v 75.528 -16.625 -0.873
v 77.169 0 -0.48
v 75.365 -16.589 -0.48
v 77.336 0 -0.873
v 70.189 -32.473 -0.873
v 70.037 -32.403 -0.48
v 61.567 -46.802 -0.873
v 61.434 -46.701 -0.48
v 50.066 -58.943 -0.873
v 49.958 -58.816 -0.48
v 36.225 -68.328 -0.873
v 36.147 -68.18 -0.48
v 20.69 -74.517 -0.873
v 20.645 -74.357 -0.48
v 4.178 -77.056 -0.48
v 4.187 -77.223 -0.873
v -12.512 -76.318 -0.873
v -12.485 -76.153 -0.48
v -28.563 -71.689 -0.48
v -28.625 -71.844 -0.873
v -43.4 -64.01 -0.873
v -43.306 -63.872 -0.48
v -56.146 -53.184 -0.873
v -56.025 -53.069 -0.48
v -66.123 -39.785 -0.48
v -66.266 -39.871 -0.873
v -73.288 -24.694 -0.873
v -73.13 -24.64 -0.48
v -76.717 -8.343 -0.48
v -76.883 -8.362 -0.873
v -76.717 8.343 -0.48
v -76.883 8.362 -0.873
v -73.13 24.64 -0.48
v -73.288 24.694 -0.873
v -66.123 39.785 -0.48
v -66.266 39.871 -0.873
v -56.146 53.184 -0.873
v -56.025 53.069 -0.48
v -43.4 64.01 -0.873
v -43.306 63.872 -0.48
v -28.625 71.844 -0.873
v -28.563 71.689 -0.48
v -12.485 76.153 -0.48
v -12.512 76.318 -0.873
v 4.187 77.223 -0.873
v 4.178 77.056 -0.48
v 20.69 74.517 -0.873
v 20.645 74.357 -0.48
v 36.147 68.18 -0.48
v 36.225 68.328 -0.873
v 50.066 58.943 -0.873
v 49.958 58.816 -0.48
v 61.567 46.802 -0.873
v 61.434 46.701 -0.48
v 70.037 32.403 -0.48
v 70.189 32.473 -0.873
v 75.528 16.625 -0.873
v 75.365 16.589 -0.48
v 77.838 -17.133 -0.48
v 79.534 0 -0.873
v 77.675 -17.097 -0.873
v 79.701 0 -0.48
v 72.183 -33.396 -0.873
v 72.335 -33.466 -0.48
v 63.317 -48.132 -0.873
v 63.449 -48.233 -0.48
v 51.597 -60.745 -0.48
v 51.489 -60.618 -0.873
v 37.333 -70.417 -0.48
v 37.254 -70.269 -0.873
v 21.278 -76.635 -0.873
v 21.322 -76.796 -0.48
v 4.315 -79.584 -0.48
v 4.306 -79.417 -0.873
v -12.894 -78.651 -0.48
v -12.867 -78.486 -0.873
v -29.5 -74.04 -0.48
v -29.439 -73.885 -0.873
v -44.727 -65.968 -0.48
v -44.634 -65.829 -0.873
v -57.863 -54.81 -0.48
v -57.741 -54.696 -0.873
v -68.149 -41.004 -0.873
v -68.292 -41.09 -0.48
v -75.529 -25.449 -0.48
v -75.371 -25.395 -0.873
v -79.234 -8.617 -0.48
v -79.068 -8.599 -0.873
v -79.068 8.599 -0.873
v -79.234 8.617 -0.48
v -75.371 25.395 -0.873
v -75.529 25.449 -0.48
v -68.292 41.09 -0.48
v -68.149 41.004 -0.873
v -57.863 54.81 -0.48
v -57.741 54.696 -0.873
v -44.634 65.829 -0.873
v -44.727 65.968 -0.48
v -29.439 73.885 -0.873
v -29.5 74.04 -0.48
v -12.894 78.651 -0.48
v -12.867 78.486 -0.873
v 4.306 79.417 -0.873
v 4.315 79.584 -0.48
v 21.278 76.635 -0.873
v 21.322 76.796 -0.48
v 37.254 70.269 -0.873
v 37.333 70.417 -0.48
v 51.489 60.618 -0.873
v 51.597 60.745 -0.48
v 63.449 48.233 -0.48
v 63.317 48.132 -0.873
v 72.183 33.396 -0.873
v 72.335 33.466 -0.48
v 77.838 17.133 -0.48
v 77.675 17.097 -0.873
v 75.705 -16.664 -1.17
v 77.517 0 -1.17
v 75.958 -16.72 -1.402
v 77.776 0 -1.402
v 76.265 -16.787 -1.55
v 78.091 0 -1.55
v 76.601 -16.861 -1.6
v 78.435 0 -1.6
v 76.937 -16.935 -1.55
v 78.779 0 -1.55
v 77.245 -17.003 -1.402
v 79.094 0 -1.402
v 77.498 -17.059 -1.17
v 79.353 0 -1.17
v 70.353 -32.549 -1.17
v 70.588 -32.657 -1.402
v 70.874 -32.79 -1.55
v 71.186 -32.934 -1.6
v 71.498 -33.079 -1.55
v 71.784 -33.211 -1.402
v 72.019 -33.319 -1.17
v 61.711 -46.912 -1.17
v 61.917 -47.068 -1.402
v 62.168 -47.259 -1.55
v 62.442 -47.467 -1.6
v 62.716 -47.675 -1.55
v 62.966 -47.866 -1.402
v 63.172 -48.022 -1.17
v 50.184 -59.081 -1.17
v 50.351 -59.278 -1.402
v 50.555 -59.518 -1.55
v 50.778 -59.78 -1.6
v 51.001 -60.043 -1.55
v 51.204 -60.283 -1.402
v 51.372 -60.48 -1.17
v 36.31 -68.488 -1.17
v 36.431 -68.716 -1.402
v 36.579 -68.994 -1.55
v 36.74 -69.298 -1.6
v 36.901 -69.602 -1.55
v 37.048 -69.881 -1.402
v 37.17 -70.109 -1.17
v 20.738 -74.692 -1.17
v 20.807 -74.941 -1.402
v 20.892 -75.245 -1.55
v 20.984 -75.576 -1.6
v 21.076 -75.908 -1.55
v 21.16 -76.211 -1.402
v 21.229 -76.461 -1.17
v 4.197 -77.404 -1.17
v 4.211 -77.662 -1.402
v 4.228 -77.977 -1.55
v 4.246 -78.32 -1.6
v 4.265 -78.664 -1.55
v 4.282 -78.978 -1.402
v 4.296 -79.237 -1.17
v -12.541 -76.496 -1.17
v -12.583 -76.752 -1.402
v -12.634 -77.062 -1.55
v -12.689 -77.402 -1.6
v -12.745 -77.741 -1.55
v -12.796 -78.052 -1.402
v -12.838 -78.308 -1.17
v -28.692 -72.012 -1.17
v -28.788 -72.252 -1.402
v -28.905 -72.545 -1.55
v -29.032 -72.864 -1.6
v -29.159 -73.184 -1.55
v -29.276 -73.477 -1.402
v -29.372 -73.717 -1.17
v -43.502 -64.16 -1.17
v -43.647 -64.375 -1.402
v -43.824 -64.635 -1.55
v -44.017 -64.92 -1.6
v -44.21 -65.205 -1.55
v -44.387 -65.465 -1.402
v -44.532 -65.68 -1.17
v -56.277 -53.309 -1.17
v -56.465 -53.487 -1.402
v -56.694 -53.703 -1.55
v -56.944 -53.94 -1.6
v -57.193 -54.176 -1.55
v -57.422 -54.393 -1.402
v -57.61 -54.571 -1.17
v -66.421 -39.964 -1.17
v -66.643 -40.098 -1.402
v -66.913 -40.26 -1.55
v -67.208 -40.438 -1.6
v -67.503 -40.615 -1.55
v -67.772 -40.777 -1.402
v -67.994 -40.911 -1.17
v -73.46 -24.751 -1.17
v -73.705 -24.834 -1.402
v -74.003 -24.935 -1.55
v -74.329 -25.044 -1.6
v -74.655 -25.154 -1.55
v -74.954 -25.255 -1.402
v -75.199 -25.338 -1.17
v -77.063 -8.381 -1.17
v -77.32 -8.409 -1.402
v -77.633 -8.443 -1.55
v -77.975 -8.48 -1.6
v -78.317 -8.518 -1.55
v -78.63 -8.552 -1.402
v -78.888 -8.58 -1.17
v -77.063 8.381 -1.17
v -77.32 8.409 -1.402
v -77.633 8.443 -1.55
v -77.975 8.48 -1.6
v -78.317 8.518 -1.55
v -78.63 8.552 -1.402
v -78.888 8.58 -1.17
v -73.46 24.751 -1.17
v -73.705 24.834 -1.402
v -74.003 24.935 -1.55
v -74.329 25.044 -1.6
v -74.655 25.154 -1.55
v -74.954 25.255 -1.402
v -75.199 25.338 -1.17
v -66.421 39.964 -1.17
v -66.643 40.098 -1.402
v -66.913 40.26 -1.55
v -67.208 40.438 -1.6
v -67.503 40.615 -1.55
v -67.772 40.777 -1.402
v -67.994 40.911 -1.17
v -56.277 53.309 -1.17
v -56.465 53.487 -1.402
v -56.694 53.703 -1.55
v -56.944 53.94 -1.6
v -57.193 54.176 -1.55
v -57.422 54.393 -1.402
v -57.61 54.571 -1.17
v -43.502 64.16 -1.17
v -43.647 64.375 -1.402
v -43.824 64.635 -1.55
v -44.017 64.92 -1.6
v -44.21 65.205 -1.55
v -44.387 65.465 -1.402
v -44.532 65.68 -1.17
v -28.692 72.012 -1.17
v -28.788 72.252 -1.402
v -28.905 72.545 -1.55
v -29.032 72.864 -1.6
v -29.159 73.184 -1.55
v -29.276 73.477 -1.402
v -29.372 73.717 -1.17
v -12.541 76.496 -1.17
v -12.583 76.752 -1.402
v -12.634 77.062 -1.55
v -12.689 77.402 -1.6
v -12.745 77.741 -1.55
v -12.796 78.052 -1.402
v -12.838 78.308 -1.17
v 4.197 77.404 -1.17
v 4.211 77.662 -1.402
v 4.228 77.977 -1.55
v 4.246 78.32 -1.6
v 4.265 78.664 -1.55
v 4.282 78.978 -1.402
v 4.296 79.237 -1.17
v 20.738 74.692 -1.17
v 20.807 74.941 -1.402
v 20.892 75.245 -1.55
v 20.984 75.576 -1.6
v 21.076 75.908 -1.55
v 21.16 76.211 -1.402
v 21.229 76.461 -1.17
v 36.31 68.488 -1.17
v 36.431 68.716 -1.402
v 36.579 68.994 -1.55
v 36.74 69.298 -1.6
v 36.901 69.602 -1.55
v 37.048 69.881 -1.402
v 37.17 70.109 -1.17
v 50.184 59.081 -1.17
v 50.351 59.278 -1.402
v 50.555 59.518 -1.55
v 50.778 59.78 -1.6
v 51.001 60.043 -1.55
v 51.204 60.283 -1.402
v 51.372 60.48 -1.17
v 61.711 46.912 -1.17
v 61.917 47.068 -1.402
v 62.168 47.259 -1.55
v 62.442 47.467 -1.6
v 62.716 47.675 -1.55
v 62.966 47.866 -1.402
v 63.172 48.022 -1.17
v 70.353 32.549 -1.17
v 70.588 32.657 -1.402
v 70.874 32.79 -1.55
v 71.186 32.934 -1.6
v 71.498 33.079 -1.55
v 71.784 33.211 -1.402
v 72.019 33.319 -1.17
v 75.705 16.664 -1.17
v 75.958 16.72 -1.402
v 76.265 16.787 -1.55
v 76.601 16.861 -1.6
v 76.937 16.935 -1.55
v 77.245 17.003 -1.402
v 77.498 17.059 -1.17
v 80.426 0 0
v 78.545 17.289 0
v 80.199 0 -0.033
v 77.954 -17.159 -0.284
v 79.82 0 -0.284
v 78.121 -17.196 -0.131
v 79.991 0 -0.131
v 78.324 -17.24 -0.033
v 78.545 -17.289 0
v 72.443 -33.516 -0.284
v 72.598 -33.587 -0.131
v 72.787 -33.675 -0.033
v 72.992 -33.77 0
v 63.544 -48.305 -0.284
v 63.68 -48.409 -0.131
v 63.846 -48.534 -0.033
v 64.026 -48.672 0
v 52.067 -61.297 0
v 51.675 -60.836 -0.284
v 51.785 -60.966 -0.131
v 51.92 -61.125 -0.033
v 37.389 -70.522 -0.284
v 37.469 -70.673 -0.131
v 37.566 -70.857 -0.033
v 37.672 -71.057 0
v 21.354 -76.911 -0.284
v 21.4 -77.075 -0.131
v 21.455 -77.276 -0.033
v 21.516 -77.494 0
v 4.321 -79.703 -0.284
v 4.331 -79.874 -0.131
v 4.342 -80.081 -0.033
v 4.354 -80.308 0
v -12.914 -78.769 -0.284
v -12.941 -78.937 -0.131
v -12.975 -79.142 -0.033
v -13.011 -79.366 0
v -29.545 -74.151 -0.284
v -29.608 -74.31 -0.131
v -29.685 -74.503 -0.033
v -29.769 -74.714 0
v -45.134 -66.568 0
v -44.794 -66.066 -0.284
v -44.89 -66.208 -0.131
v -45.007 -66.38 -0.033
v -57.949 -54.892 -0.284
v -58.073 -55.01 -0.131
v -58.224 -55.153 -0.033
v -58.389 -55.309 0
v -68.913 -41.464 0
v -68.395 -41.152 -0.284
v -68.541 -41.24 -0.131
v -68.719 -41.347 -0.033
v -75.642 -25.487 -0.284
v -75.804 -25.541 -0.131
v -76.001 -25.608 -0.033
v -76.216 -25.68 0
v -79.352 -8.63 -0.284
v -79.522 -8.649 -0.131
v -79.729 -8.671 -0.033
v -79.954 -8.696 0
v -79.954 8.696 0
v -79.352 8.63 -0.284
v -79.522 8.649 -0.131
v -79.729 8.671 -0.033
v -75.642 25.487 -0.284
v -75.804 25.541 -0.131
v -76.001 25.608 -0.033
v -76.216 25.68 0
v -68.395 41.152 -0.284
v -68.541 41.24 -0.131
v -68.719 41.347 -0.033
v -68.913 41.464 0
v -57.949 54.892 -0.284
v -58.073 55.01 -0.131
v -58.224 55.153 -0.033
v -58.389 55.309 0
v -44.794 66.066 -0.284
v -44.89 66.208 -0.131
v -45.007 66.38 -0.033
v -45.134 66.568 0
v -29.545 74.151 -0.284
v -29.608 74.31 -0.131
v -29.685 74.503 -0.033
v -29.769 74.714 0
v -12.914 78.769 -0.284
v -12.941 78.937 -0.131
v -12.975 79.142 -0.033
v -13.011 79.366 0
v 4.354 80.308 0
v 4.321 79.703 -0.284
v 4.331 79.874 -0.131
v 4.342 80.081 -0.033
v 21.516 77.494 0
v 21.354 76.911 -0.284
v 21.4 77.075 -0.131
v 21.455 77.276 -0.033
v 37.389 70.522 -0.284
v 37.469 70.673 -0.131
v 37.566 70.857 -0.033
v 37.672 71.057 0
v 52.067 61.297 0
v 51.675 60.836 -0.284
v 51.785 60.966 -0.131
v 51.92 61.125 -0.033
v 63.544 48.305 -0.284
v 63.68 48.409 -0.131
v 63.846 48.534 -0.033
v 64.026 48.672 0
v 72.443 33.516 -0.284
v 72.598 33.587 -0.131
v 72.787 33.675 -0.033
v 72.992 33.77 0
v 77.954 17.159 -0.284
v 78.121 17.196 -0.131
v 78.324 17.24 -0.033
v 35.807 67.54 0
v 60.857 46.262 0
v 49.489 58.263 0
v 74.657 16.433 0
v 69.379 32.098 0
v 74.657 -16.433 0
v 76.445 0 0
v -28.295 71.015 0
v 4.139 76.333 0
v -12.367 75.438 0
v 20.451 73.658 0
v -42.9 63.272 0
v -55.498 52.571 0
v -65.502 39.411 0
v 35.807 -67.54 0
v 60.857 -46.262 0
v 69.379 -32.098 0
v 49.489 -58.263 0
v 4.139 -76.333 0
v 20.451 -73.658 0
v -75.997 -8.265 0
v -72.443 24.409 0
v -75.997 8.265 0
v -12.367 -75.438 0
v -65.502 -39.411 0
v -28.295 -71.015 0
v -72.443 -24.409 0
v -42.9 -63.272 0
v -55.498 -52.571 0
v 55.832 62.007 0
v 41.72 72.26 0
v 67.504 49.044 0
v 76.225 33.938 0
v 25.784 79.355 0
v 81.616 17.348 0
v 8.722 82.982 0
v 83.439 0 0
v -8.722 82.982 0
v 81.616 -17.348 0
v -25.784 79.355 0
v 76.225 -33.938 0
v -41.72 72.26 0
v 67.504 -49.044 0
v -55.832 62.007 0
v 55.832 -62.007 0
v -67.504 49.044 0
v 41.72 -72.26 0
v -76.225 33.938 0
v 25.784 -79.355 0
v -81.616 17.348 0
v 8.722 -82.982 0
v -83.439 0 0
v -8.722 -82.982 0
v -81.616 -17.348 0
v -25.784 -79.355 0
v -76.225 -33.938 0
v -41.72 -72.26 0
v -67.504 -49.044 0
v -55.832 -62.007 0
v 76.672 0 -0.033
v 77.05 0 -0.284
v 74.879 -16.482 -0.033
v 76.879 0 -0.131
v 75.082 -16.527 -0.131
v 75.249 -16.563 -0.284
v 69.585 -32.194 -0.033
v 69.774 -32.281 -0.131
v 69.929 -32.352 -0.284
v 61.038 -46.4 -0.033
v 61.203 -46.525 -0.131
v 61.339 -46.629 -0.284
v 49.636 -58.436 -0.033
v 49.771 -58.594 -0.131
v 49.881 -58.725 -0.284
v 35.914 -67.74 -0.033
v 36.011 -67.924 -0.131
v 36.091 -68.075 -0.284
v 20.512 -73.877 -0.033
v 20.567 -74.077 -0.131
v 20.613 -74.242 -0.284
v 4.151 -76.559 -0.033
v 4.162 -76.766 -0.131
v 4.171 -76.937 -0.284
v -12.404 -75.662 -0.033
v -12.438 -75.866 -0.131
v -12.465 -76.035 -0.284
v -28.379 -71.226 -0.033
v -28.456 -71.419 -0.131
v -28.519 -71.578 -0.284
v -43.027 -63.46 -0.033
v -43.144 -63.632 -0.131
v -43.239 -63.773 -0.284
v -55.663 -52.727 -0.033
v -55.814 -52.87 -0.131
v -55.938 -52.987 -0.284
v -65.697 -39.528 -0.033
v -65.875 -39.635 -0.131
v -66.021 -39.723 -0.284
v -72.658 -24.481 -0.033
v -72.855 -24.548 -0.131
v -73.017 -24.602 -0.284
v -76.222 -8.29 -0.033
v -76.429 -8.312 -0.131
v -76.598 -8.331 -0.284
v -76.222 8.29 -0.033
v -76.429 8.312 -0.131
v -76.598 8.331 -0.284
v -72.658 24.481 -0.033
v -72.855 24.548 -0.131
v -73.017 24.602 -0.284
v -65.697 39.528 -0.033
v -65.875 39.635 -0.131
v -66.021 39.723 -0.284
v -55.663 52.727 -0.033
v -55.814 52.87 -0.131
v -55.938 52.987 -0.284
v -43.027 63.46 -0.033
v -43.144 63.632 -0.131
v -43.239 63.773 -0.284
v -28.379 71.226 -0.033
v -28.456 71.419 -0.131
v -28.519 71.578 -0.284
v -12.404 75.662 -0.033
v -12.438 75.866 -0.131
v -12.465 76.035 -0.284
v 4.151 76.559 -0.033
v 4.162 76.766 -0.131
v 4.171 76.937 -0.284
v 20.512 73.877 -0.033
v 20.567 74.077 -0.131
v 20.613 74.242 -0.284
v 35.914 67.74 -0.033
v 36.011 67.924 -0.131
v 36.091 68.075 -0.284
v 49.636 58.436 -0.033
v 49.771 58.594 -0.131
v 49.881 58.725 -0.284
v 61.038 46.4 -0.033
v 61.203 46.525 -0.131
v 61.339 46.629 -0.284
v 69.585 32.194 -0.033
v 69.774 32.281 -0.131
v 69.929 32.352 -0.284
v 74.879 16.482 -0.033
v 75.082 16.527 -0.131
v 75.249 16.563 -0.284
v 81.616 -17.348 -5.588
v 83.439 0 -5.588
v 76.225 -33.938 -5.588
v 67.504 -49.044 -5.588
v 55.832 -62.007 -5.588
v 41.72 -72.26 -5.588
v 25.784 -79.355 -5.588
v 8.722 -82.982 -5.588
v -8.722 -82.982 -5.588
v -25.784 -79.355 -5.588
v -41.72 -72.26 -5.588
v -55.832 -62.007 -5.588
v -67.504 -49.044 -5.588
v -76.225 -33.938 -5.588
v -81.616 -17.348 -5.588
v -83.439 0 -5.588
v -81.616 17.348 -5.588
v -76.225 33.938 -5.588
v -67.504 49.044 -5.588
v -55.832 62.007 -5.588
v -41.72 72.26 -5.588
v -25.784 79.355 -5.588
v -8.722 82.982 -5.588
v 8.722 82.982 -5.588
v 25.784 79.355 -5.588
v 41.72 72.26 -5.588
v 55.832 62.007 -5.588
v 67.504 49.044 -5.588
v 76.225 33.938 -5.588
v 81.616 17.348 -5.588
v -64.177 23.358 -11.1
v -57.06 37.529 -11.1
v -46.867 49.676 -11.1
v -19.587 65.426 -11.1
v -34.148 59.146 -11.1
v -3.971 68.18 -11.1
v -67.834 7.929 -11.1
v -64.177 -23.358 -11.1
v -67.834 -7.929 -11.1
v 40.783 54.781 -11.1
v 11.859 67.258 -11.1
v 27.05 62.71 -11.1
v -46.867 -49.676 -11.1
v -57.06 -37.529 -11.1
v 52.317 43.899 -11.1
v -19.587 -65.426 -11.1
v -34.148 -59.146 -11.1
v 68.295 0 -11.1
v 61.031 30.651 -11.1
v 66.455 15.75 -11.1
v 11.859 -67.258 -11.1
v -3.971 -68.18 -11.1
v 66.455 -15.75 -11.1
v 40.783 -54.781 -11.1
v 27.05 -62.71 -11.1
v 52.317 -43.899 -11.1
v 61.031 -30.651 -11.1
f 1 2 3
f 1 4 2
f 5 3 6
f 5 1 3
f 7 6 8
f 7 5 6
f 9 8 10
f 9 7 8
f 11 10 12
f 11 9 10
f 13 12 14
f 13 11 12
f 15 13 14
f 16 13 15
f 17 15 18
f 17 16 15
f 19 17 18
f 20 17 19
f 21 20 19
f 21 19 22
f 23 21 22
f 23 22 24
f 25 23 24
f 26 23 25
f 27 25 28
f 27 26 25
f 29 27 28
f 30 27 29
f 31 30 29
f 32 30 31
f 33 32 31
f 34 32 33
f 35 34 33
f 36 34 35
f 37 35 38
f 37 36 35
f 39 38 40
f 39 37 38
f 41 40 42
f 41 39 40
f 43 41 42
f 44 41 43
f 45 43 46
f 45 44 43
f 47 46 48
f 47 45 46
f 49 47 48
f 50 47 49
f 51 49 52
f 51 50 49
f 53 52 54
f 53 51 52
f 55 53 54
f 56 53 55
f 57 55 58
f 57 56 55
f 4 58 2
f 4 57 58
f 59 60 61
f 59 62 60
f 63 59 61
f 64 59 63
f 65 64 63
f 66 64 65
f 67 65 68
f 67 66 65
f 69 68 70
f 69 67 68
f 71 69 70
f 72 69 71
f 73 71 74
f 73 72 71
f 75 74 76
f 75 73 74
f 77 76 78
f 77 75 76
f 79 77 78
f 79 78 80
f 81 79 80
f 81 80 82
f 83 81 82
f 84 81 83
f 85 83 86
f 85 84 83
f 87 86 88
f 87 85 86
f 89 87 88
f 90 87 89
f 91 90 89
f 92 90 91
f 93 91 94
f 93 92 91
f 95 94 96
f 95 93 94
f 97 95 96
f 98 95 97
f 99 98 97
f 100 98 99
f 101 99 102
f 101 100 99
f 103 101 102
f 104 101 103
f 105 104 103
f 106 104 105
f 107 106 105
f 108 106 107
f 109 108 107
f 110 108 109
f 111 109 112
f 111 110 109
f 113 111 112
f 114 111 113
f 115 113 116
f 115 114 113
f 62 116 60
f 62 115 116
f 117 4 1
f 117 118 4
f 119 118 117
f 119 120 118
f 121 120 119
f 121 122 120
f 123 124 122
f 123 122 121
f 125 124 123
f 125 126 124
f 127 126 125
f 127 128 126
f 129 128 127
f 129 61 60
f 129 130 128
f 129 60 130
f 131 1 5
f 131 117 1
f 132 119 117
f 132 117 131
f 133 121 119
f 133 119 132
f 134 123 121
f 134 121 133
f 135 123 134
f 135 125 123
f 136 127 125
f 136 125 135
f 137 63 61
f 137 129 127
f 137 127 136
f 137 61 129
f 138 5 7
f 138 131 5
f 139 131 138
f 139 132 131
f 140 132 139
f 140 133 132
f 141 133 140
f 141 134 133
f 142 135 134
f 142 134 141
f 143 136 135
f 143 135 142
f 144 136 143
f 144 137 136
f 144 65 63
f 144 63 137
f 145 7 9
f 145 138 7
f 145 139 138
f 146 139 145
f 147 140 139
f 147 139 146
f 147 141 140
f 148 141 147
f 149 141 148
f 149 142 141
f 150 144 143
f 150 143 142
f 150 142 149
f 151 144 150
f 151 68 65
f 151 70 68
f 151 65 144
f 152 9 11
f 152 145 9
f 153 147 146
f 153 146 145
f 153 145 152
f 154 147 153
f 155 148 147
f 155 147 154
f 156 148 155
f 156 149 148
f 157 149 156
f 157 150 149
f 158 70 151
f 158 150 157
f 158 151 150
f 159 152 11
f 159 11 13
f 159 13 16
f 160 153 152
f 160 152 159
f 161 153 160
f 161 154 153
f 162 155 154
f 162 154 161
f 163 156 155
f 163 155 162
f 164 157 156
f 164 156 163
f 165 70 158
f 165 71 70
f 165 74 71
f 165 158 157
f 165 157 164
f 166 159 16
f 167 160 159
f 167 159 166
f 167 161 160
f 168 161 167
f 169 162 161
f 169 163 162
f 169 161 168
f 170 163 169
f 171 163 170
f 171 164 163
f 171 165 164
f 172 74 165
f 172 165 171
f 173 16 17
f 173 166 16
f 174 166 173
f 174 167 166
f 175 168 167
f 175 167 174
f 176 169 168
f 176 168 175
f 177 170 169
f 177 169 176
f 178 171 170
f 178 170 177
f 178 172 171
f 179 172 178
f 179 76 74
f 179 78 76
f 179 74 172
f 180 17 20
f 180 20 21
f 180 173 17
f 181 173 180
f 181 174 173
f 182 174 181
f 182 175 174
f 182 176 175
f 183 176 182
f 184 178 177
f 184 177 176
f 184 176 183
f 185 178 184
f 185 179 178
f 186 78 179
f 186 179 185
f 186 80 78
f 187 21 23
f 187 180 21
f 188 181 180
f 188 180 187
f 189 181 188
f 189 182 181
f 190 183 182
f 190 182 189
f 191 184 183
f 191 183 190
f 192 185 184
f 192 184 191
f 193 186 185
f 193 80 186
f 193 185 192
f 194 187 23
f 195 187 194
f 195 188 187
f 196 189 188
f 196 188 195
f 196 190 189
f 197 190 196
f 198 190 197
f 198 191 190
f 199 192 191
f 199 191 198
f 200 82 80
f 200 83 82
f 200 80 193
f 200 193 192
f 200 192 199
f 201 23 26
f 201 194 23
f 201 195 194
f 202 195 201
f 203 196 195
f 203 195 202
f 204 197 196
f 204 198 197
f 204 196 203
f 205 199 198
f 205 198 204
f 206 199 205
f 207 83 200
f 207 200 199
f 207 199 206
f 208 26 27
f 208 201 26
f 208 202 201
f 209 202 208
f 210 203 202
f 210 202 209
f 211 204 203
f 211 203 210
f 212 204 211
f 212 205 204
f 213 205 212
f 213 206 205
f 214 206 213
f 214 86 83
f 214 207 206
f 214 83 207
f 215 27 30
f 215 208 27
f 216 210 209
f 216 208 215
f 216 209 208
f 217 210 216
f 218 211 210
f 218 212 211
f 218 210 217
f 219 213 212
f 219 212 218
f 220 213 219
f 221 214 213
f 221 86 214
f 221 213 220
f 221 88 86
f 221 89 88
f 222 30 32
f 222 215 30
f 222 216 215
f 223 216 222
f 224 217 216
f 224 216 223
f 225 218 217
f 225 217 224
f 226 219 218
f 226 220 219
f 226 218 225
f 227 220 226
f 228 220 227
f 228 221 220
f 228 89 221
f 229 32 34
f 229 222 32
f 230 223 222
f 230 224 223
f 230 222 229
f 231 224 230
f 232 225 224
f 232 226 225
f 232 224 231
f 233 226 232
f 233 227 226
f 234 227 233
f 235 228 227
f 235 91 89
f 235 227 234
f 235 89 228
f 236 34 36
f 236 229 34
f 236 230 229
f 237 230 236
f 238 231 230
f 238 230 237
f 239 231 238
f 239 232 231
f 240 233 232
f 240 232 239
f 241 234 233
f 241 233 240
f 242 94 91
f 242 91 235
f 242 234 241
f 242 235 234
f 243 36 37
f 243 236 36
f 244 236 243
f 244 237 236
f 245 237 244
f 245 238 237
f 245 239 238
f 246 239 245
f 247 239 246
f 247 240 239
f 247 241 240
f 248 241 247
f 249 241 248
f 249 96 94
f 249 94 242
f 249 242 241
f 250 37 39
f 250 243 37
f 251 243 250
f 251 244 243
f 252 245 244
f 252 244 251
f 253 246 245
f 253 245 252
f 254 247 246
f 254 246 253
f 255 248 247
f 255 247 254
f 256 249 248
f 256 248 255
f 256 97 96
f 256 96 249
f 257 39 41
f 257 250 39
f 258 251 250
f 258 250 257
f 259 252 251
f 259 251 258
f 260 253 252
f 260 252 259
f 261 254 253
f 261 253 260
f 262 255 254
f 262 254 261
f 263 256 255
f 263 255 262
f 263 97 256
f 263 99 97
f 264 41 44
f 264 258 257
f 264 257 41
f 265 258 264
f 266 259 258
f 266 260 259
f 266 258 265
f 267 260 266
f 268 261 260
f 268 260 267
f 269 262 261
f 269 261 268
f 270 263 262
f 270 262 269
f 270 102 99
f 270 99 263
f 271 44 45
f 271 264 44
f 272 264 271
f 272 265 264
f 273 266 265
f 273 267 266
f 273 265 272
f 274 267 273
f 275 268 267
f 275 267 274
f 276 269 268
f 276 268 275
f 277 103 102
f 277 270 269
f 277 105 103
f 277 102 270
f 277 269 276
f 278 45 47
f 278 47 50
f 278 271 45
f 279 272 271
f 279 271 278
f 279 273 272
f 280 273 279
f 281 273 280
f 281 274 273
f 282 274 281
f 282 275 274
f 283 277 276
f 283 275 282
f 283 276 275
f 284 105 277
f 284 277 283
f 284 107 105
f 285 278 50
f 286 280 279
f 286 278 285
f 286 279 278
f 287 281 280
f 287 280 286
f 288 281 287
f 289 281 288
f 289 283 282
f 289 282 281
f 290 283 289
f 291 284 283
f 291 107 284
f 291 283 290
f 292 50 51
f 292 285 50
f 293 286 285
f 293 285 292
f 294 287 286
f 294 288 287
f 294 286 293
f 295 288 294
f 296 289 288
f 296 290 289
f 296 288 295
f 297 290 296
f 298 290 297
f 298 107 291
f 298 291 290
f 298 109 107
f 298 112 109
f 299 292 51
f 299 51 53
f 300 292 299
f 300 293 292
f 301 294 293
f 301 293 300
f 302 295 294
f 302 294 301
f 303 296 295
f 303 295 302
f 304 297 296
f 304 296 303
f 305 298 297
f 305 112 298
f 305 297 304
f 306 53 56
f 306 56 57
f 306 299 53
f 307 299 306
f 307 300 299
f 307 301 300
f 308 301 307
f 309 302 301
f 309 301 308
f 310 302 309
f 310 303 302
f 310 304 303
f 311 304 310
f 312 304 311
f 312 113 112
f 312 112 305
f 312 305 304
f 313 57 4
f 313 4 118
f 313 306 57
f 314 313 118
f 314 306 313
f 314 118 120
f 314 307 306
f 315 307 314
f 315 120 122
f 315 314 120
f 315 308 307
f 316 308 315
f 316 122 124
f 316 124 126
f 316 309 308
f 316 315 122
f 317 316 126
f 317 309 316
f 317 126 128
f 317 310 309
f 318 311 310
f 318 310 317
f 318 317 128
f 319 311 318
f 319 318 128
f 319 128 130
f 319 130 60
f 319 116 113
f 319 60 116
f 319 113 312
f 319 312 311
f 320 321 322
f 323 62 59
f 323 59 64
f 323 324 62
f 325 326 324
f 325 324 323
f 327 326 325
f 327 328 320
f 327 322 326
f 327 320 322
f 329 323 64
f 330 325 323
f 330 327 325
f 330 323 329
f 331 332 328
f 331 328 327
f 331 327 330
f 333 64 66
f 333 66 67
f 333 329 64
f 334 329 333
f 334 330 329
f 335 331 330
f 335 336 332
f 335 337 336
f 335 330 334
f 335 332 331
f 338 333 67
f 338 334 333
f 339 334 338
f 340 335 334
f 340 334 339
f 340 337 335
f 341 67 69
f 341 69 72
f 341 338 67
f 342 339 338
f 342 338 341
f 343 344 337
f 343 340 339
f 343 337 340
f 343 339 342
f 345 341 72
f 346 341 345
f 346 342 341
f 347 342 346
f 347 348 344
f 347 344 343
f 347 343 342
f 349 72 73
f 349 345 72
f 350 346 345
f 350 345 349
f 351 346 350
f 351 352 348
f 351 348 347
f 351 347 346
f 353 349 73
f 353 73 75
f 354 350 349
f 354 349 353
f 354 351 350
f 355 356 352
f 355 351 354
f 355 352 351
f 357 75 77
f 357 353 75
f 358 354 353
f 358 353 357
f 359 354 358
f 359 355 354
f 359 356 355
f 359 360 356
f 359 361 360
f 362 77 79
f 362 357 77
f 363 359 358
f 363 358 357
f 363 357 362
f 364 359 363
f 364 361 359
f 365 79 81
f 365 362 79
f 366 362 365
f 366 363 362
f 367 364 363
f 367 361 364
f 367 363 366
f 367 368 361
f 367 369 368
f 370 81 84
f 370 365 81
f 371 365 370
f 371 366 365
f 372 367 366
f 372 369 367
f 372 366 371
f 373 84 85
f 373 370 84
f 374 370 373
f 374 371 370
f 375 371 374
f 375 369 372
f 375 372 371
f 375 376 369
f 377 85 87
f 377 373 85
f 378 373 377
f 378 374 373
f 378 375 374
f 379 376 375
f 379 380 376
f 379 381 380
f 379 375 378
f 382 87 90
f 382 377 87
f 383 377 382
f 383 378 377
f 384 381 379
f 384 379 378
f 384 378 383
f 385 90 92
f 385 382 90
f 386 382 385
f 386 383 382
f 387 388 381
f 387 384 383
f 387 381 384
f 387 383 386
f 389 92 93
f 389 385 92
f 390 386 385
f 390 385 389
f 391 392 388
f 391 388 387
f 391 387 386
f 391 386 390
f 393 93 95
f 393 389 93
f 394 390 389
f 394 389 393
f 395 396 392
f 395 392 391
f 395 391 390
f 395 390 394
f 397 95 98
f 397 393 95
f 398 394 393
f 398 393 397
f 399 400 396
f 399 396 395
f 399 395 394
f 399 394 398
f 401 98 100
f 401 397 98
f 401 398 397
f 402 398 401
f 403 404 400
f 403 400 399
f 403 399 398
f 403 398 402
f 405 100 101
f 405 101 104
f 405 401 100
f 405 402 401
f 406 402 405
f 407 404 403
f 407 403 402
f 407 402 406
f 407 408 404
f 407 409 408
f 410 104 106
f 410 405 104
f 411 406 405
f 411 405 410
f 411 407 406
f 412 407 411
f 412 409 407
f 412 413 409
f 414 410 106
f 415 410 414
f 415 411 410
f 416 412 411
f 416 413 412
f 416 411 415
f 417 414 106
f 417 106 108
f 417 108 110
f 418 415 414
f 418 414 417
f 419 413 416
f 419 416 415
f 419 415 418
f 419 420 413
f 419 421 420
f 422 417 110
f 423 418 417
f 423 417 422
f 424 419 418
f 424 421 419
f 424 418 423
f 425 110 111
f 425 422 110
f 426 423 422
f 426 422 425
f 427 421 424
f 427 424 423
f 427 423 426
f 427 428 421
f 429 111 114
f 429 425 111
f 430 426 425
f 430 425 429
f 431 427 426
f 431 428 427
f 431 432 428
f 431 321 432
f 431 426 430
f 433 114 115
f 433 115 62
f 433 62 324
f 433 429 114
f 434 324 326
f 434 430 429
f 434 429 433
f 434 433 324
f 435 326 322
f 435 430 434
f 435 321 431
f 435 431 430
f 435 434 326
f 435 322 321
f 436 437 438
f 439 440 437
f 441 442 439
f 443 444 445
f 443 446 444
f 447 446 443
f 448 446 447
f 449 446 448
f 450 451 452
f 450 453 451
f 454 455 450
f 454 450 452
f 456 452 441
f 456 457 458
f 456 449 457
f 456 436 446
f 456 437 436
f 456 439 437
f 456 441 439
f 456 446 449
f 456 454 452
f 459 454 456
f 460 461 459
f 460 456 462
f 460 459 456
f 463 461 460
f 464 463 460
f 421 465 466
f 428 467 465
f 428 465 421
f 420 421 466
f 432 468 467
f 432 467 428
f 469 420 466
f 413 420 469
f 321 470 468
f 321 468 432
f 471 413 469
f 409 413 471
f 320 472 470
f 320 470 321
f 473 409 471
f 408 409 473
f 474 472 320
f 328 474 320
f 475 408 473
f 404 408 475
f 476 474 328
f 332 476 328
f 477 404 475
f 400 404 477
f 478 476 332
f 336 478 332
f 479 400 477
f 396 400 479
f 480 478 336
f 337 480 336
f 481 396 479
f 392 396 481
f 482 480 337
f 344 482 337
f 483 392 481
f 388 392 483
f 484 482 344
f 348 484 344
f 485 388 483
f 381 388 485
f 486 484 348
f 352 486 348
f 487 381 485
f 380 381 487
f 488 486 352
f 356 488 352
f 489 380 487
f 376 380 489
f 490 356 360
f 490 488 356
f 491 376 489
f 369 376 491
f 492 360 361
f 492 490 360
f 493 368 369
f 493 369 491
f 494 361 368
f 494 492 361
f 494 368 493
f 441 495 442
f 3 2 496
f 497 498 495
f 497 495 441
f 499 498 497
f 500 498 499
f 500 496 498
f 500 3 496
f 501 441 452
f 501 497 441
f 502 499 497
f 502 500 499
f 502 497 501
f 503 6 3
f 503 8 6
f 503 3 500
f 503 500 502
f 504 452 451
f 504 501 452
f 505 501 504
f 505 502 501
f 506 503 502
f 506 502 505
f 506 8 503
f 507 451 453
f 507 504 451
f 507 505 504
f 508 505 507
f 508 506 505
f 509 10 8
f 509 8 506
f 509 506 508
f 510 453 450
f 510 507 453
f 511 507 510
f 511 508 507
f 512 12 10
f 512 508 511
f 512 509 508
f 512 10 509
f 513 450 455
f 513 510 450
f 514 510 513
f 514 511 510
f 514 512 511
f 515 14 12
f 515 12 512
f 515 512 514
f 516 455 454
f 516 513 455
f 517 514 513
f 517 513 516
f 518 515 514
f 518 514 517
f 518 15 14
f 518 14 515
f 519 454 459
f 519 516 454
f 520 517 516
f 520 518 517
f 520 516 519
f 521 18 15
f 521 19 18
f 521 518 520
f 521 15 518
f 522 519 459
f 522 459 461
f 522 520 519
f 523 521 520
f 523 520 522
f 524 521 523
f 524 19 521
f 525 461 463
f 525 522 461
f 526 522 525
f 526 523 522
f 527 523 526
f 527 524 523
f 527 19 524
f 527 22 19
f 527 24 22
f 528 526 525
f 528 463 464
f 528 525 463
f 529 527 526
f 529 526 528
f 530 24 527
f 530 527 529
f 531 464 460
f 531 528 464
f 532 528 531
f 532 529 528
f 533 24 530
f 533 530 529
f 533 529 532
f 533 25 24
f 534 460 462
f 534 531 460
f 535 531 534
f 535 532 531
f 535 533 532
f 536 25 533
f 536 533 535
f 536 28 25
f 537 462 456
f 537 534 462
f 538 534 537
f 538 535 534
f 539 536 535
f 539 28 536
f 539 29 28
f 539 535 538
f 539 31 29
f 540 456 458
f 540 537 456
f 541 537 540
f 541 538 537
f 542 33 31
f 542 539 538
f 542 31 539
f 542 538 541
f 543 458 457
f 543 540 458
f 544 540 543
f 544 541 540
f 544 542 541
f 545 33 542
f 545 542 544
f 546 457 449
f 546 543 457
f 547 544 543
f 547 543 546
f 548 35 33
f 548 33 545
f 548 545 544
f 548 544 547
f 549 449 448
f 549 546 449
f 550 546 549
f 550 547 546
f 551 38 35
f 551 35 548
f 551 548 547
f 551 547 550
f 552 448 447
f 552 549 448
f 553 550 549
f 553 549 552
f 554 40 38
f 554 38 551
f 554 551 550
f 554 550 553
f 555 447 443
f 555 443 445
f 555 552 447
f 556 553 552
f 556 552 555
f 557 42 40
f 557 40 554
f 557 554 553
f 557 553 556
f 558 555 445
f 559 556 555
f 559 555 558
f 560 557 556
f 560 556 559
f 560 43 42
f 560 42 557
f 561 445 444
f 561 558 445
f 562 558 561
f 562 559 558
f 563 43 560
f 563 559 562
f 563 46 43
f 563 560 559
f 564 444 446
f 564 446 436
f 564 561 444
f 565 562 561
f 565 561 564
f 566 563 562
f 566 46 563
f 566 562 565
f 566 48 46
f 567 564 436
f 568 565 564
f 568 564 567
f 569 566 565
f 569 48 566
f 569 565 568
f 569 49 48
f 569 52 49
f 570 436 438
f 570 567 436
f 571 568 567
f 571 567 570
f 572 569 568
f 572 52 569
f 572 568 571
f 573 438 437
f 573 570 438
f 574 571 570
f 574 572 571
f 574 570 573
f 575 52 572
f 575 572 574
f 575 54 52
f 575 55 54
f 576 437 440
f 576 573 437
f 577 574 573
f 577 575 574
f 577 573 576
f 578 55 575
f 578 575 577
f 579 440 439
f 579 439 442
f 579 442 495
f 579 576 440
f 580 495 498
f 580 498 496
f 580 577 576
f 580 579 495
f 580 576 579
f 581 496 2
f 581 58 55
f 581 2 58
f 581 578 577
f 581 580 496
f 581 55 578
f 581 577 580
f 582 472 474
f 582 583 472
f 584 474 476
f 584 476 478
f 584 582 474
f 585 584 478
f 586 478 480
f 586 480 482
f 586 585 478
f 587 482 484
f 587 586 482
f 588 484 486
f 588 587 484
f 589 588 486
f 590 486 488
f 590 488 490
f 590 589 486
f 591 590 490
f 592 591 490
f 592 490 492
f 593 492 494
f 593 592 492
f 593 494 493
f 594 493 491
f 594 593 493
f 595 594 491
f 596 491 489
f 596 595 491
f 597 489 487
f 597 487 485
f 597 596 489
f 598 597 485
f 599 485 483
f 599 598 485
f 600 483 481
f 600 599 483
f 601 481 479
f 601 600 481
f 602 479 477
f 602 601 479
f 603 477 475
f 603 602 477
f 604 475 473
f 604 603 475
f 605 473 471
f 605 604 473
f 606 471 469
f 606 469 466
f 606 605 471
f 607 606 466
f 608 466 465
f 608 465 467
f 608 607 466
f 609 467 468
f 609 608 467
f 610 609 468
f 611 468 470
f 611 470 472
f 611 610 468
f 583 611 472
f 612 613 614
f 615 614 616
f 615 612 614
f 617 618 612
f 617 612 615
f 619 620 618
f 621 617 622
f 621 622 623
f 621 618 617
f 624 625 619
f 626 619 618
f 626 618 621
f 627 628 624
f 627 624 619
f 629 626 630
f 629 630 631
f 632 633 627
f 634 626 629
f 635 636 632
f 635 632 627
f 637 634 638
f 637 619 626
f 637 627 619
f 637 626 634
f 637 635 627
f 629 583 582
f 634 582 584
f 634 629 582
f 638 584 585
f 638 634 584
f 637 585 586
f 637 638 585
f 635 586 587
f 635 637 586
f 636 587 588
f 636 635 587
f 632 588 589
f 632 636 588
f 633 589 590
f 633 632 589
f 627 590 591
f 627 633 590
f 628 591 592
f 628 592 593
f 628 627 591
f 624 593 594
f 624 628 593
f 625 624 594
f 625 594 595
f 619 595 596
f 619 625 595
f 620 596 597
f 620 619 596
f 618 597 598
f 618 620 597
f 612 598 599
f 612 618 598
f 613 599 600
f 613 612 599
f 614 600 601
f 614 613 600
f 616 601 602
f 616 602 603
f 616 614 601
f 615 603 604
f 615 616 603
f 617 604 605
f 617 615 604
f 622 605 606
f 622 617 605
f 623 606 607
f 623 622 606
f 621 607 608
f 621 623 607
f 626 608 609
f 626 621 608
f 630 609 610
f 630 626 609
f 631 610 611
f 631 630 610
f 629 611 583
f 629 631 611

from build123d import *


with BuildPart() as part:
    # Sketch1 → Revolve1 (revolve)
    with BuildSketch(Plane(origin=(0, 0, 0), x_dir=(0, 0, -1), z_dir=(1, 0, 0)), mode=Mode.PRIVATE) as revolve1_sk:
        with BuildLine():
            Line((0, 0), (0, 76.444627725))
            ThreePointArc((0, 76.444627725), (0.130798304, 76.879222907), (0.479738309, 77.169433247))
            Line((0.479738309, 77.169433247), (0.872854821, 77.336301306))
            ThreePointArc((0.872854821, 77.336301306), (1.6002, 78.4352), (0.872854821, 79.534098694))
            Line((0.872854821, 79.534098694), (0.479738309, 79.700966753))
            ThreePointArc((0.479738309, 79.700966753), (0.130798304, 79.991177093), (0, 80.425772275))
            Line((0, 80.425772275), (0, 83.439))
            Line((0, 83.439), (5.588, 83.439))
            Line((5.588, 83.439), (11.0998, 68.295453959))
            Line((11.0998, 68.295453959), (11.0998, 0))
            Line((11.0998, 0), (0, 0))
        make_face()
    revolve(revolve1_sk.sketch.rotate(Axis((0, 0, 0), (0, 0, -1)), 90), axis=Axis((0, 0, 0), (0, 0, -1)))


solid = part.part
